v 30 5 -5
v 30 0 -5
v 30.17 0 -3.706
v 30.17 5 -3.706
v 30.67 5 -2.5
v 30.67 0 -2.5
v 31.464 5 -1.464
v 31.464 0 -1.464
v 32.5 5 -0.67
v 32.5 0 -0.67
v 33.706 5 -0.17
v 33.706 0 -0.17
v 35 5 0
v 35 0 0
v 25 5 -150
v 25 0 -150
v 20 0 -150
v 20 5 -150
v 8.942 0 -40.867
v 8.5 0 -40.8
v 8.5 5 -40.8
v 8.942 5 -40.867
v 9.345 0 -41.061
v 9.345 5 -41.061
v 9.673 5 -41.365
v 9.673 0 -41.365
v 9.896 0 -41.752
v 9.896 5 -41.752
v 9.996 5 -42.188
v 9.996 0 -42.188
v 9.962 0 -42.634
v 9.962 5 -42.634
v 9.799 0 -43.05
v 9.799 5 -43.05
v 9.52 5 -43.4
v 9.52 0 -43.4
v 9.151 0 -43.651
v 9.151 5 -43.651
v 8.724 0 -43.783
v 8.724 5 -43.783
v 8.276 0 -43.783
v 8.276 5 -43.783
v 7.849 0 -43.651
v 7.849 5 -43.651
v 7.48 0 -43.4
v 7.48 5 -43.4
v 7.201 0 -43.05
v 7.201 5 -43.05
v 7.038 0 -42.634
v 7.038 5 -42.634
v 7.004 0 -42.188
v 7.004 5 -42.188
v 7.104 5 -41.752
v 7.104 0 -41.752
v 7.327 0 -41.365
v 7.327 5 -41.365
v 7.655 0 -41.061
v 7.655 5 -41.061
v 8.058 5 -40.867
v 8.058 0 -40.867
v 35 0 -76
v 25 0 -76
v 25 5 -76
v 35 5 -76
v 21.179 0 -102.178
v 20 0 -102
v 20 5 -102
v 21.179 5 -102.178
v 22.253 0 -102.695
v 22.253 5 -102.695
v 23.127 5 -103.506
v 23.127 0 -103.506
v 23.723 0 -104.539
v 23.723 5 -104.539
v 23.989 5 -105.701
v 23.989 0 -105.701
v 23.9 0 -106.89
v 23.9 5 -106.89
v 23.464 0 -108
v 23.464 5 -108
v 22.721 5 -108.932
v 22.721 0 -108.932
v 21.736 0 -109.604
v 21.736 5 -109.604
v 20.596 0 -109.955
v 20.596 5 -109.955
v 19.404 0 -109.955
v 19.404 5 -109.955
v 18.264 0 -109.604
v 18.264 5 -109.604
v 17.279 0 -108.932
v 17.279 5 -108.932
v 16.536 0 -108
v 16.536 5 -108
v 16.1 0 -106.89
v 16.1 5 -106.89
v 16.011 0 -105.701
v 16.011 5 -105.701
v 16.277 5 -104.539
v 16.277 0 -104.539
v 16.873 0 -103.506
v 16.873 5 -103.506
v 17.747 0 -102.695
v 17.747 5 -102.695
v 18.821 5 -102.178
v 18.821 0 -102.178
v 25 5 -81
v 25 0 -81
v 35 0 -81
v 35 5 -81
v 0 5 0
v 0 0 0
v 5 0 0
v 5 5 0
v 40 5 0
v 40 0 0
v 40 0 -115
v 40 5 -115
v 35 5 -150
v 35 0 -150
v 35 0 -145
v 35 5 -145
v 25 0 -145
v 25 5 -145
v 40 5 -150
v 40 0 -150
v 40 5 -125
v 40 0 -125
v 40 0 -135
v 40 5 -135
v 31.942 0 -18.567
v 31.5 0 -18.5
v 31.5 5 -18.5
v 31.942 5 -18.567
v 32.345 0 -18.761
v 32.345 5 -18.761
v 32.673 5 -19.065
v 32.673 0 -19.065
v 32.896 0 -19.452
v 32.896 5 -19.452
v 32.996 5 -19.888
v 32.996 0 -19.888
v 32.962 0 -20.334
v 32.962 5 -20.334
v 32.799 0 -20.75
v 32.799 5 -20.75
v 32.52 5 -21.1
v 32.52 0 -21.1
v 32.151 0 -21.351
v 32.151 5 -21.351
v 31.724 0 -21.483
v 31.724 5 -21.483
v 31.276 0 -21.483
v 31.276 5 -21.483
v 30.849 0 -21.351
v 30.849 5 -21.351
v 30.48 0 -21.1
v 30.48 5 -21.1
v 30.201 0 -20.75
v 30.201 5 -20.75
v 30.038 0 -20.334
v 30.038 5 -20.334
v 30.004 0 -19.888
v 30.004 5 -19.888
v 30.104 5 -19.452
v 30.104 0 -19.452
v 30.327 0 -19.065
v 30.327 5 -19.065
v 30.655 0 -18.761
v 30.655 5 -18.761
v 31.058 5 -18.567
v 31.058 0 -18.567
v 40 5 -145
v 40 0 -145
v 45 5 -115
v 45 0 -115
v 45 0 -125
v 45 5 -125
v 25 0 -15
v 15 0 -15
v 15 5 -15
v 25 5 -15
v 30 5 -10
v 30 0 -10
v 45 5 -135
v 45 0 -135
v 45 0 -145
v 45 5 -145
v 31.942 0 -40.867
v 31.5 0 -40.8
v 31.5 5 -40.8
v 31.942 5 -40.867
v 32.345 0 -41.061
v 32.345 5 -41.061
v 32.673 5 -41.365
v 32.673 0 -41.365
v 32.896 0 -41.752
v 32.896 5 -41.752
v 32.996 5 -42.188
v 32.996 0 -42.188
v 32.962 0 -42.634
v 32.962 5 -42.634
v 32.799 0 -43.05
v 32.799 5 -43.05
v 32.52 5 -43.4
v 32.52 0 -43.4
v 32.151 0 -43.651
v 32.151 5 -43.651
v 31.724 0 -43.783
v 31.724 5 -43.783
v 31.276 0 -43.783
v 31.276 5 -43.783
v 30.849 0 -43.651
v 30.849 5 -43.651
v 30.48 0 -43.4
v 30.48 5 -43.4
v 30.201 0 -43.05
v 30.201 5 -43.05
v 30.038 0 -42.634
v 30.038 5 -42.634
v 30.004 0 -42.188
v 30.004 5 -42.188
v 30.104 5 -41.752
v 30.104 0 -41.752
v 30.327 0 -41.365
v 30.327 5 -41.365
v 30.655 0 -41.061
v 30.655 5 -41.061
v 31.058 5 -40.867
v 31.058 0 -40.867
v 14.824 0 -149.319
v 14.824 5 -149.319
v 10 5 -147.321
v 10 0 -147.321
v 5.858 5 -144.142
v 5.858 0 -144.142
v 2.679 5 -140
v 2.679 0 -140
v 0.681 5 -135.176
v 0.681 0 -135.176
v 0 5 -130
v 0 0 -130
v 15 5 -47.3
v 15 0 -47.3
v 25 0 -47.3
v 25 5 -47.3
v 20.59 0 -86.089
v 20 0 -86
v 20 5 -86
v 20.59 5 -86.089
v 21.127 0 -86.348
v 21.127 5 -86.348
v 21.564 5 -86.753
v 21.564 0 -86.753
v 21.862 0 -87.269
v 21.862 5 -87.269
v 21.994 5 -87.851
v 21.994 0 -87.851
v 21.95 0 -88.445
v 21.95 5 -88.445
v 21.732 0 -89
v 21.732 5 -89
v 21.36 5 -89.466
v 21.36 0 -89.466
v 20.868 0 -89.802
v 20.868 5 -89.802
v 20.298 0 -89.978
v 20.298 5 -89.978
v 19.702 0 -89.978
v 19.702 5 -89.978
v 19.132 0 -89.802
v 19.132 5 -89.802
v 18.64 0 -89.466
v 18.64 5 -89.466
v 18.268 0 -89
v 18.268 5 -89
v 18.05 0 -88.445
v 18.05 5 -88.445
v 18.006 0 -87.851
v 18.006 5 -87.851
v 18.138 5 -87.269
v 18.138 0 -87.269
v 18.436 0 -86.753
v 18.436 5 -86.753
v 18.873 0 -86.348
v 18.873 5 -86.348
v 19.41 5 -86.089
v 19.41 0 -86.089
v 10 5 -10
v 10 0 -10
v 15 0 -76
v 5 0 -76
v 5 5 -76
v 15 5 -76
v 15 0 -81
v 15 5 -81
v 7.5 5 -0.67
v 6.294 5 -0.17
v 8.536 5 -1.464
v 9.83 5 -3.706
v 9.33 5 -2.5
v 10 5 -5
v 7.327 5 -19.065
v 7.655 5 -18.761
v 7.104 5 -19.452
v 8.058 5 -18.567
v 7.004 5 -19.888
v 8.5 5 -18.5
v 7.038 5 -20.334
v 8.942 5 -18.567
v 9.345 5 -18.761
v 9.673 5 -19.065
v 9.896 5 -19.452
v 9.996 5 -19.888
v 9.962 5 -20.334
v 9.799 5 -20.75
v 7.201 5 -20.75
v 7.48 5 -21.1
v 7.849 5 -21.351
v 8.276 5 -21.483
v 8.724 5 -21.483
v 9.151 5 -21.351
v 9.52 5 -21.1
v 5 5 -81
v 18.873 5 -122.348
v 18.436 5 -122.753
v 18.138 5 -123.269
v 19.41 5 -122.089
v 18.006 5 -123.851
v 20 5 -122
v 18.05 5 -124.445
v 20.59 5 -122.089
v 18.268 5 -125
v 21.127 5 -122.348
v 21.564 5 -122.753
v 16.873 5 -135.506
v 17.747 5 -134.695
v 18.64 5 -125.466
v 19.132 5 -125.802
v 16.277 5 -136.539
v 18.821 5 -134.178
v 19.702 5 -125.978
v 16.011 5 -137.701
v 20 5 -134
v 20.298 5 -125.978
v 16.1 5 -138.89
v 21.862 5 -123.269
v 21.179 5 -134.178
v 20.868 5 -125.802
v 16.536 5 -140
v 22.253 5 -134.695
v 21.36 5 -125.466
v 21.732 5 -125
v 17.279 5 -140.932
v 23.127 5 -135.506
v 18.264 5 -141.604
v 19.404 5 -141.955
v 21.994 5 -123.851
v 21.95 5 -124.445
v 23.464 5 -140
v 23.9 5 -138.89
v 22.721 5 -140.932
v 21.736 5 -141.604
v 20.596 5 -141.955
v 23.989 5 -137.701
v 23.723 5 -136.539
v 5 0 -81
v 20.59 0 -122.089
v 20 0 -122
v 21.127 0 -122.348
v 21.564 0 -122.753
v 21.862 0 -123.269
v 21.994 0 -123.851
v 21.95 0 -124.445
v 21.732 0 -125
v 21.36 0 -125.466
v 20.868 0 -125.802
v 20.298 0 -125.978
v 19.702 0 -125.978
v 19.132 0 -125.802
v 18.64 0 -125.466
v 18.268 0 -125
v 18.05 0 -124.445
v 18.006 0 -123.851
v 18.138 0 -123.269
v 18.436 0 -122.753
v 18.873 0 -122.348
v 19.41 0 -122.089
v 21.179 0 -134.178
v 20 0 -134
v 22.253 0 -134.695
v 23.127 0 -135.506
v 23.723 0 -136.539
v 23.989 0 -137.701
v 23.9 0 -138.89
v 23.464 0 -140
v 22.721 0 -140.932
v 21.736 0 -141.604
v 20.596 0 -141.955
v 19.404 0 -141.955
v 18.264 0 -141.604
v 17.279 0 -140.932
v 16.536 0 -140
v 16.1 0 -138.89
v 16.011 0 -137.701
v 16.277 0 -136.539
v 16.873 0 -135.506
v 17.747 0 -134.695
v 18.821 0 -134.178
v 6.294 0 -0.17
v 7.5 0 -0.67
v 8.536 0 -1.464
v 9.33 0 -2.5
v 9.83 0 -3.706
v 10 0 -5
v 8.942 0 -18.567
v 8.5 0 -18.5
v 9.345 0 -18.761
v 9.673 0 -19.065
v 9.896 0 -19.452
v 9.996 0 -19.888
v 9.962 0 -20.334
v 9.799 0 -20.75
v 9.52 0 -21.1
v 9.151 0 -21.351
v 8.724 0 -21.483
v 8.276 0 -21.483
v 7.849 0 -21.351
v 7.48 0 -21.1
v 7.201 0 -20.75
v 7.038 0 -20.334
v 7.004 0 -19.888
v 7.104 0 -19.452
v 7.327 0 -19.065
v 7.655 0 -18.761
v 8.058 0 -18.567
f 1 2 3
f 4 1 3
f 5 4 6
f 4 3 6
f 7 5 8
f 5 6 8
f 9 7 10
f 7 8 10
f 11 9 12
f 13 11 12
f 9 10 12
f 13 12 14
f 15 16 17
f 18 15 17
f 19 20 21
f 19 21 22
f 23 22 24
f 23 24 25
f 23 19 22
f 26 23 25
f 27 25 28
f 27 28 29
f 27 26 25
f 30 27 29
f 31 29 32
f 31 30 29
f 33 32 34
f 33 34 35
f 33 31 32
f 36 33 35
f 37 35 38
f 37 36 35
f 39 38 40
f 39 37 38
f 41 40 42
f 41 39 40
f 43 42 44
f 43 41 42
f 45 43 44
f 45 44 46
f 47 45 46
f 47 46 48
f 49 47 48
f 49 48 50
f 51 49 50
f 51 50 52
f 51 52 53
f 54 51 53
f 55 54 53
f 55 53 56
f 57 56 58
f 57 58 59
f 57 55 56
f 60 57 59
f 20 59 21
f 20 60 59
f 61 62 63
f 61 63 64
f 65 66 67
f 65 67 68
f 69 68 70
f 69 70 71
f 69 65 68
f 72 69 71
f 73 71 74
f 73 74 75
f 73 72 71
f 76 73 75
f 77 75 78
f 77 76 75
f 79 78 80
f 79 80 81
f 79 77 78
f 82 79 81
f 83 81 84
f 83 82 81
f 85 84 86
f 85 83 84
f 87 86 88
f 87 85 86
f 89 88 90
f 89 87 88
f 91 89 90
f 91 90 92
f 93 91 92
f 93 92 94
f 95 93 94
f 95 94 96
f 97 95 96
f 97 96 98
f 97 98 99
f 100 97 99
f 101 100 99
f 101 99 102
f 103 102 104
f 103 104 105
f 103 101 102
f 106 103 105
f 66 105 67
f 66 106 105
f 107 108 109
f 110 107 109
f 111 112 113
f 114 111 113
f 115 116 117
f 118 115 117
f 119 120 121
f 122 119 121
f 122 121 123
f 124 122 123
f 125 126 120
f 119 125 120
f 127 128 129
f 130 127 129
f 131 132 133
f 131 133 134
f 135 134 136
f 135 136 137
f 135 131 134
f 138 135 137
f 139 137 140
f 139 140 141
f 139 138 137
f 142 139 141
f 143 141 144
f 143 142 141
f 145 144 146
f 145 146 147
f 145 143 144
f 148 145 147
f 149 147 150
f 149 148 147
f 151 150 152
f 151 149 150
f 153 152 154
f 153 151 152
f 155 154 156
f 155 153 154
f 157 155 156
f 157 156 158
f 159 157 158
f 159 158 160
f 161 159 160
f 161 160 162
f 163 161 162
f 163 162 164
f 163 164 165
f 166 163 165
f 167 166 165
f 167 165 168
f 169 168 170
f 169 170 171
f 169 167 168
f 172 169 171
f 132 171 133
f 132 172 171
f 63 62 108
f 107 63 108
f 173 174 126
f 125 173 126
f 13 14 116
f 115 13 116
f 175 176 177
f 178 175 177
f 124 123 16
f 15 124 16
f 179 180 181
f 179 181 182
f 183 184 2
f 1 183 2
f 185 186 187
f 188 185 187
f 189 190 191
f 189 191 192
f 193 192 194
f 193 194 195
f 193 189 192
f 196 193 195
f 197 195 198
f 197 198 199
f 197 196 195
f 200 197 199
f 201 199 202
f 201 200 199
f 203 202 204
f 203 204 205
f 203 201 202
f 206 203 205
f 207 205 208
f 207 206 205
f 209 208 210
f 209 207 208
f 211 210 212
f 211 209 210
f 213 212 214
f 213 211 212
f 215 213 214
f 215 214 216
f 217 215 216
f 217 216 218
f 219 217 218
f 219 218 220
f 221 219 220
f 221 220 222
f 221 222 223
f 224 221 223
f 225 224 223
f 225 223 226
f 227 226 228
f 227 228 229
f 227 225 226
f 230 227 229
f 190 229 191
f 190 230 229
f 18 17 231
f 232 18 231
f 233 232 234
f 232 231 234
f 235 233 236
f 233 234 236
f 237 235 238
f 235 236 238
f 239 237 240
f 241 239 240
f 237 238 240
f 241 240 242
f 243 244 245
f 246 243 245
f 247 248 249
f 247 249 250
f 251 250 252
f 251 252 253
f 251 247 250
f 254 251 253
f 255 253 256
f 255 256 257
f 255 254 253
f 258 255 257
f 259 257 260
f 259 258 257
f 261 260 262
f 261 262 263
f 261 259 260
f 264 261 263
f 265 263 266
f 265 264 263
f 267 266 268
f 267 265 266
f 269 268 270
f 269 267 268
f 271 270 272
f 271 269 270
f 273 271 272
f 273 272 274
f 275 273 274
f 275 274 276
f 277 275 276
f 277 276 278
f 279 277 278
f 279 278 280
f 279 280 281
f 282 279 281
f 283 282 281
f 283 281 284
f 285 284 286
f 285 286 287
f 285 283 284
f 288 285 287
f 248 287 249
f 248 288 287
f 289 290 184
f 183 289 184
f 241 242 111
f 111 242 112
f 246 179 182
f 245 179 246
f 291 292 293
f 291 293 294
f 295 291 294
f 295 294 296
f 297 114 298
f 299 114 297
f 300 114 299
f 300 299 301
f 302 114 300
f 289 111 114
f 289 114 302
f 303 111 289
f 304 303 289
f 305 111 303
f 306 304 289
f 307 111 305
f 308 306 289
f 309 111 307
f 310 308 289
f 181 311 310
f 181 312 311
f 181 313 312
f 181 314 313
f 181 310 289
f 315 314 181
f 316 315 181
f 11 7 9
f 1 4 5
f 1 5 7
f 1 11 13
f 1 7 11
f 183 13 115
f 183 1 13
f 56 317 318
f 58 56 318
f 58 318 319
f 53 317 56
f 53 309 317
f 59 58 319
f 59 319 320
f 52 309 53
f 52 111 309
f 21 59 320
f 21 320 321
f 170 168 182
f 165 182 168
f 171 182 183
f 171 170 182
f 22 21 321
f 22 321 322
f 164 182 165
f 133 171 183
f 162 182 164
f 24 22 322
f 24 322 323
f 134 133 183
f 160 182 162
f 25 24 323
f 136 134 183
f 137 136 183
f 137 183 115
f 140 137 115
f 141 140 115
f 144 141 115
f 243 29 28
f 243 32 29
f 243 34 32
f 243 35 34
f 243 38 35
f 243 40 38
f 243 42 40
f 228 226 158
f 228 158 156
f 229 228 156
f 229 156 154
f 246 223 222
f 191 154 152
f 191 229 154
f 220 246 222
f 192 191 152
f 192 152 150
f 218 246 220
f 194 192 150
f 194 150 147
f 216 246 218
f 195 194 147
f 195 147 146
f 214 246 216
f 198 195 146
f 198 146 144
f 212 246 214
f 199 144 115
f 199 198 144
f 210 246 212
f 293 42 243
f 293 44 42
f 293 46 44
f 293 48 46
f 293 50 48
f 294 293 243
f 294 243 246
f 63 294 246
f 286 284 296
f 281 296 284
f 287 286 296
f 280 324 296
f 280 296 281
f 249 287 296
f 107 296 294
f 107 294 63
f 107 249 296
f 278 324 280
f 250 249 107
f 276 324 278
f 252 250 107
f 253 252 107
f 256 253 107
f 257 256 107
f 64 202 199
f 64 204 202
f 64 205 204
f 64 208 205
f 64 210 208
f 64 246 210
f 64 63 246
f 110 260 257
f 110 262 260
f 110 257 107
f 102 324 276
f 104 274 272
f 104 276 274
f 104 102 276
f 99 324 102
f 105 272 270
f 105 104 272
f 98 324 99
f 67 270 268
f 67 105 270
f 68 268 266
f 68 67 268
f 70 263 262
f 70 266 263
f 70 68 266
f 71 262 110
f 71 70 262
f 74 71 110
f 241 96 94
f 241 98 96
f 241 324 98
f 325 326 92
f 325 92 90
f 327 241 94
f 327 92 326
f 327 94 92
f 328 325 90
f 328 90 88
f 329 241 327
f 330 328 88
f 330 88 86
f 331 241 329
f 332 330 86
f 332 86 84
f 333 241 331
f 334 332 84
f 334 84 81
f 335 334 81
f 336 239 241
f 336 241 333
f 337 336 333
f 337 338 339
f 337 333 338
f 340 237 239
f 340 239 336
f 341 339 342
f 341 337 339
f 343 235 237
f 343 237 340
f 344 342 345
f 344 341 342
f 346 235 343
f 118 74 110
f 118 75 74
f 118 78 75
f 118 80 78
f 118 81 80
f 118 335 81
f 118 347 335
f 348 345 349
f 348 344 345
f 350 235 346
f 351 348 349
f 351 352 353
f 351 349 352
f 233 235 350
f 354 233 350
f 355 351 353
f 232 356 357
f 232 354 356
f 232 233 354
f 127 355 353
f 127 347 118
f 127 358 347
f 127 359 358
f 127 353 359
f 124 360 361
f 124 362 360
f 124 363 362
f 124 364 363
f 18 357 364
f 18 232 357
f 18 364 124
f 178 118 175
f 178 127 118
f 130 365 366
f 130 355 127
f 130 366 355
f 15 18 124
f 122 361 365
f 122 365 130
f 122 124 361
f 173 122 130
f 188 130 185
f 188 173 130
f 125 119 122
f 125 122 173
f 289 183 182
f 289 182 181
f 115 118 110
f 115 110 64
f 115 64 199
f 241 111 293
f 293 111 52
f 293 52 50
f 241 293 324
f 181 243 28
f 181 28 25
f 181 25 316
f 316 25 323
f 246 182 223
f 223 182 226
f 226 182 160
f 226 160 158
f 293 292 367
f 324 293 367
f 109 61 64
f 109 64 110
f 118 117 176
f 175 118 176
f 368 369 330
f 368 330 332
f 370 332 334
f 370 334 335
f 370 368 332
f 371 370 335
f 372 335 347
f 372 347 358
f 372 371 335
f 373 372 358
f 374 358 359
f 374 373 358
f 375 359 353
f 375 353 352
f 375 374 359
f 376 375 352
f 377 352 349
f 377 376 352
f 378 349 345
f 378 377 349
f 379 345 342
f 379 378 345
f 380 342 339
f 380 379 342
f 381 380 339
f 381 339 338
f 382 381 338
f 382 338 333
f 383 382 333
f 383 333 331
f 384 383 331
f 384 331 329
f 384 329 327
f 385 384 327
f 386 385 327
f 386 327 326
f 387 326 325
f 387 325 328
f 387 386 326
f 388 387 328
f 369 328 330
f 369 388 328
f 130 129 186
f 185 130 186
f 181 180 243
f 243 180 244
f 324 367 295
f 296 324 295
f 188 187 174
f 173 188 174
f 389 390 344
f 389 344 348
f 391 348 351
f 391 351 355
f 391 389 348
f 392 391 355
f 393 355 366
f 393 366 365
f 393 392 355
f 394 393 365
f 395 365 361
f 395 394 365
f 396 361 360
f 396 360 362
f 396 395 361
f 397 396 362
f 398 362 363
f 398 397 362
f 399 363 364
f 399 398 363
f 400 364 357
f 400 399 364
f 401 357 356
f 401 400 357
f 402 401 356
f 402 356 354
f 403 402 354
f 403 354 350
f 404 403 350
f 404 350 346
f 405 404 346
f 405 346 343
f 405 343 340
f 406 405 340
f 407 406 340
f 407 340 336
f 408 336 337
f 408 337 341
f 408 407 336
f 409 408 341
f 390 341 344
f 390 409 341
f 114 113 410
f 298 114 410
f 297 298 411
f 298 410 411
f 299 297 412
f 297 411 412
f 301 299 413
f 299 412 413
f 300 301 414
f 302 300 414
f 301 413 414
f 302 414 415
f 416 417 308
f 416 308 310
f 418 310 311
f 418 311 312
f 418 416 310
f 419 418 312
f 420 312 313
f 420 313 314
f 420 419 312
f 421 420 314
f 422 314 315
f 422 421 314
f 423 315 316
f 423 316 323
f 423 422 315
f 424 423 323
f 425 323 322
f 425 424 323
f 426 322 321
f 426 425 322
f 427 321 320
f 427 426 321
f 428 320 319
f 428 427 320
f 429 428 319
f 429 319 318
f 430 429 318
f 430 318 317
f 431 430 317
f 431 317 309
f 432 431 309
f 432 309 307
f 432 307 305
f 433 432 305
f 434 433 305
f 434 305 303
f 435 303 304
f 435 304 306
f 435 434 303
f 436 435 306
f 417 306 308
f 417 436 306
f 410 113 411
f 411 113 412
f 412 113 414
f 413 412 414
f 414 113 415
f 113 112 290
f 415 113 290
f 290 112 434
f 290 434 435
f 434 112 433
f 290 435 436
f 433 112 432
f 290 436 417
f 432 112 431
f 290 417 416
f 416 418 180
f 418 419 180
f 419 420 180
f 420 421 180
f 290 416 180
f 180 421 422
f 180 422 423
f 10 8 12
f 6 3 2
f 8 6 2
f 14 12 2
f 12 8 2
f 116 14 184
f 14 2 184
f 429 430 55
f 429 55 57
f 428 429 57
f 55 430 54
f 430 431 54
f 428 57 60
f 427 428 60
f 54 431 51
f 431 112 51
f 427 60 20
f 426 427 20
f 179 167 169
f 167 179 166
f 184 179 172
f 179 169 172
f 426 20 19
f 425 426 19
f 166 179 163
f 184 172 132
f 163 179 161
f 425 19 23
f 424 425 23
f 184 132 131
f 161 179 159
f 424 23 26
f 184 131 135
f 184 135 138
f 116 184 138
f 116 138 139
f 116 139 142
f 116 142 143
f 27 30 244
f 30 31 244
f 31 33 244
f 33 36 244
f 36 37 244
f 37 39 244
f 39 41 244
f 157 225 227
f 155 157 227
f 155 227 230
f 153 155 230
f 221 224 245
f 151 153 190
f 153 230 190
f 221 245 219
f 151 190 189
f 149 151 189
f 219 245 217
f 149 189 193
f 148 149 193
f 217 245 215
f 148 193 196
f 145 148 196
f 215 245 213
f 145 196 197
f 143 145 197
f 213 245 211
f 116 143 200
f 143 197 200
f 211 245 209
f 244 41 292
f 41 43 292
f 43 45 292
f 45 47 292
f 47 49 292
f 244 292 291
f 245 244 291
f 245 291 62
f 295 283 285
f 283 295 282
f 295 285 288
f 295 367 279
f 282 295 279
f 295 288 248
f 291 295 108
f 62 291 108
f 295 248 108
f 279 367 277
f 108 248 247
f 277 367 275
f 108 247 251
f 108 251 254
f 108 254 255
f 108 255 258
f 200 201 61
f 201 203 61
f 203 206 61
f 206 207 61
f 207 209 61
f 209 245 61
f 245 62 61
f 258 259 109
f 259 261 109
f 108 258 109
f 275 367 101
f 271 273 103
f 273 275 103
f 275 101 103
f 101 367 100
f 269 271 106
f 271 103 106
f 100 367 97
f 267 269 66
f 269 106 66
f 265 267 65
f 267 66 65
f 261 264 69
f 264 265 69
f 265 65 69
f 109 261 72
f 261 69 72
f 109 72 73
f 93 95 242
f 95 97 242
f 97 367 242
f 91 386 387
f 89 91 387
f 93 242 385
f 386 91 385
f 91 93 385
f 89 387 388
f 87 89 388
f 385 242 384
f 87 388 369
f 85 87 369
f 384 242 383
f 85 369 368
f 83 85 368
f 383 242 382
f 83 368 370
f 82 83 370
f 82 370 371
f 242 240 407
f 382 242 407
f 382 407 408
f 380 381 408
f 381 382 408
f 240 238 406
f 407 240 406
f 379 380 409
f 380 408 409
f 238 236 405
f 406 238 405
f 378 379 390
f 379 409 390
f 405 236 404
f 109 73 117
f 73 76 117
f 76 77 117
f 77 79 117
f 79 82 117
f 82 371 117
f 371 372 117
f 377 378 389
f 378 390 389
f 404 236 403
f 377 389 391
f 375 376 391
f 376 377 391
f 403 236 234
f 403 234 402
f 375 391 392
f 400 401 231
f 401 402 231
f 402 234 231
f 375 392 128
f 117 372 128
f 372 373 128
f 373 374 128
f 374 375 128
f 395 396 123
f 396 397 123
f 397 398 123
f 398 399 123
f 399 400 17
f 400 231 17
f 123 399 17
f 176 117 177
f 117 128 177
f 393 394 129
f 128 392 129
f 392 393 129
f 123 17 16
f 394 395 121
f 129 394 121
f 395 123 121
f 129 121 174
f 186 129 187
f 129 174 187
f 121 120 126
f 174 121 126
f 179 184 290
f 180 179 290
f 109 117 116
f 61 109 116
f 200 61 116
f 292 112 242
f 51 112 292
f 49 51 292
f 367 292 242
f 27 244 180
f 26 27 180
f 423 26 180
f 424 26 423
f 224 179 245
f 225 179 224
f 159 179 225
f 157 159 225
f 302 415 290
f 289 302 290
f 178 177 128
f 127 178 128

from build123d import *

# Parameters (mm, degrees)
SKETCH_1_R      = 4
SKETCH_1_R_2    = 2
SKETCH_1_R_3    = 1.5
SKETCH_1_W      = 10
SKETCH_1_H      = 5
SKETCH_1_H_2    = 32.3
EXTRUDE_1_DEPTH = 5


with BuildPart() as part:
    # 草图1 → 凸台-拉伸1 (new body)
    with BuildSketch(Plane(origin=(0, 0, 0), x_dir=(1, 0, 0), z_dir=(0, 1, 0))):
        with BuildLine():
            Line((10, 5), (10, 10))
            Line((10, 10), (30, 10))
            Line((30, 10), (30, 5))
            ThreePointArc((30, 5), (31.464466094, 1.464466094), (35, 0))
            Line((35, 0), (40, 0))
            Line((40, 0), (40, 115))
            Line((40, 115), (45, 115))
            Line((45, 115), (45, 125))
            Line((45, 125), (40, 125))
            Line((40, 125), (40, 135))
            Line((40, 135), (45, 135))
            Line((45, 135), (45, 145))
            Line((45, 145), (40, 145))
            Line((40, 145), (40, 150))
            Line((40, 150), (35, 150))
            Line((35, 150), (35, 145))
            Line((35, 145), (25, 145))
            Line((25, 145), (25, 150))
            Line((25, 150), (20, 150))
            ThreePointArc((20, 150), (5.857864376, 144.142135624), (0, 130))
            Line((0, 130), (0, 0))
            Line((0, 0), (5, 0))
            ThreePointArc((5, 0), (8.535533906, 1.464466094), (10, 5))
        make_face()
        with Locations(Location((20, 138, 0), (0, 0, 270))):
            Circle(SKETCH_1_R, mode=Mode.SUBTRACT)
        with Locations(Location((20, 106, 0), (0, 0, 270))):
            Circle(SKETCH_1_R, mode=Mode.SUBTRACT)
        with Locations(Location((20, 124, 0), (0, 0, 270))):
            Circle(SKETCH_1_R_2, mode=Mode.SUBTRACT)
        with Locations(Location((20, 88, 0), (0, 0, 270))):
            Circle(SKETCH_1_R_2, mode=Mode.SUBTRACT)
        with Locations(Location((8.5, 42.3, 0), (0, 0, 270))):
            Circle(SKETCH_1_R_3, mode=Mode.SUBTRACT)
        with Locations(Location((31.5, 42.3, 0), (0, 0, 270))):
            Circle(SKETCH_1_R_3, mode=Mode.SUBTRACT)
        with Locations(Location((8.5, 20, 0), (0, 0, 270))):
            Circle(SKETCH_1_R_3, mode=Mode.SUBTRACT)
        with Locations(Location((31.5, 20, 0), (0, 0, 270))):
            Circle(SKETCH_1_R_3, mode=Mode.SUBTRACT)
        with Locations((10, 78.5)):
            Rectangle(SKETCH_1_W, SKETCH_1_H, mode=Mode.SUBTRACT)
        with Locations((30, 78.5)):
            Rectangle(SKETCH_1_W, SKETCH_1_H, mode=Mode.SUBTRACT)
        with Locations((20, 31.15)):
            Rectangle(SKETCH_1_W, SKETCH_1_H_2, mode=Mode.SUBTRACT)
    extrude(amount=EXTRUDE_1_DEPTH)


solid = part.part
